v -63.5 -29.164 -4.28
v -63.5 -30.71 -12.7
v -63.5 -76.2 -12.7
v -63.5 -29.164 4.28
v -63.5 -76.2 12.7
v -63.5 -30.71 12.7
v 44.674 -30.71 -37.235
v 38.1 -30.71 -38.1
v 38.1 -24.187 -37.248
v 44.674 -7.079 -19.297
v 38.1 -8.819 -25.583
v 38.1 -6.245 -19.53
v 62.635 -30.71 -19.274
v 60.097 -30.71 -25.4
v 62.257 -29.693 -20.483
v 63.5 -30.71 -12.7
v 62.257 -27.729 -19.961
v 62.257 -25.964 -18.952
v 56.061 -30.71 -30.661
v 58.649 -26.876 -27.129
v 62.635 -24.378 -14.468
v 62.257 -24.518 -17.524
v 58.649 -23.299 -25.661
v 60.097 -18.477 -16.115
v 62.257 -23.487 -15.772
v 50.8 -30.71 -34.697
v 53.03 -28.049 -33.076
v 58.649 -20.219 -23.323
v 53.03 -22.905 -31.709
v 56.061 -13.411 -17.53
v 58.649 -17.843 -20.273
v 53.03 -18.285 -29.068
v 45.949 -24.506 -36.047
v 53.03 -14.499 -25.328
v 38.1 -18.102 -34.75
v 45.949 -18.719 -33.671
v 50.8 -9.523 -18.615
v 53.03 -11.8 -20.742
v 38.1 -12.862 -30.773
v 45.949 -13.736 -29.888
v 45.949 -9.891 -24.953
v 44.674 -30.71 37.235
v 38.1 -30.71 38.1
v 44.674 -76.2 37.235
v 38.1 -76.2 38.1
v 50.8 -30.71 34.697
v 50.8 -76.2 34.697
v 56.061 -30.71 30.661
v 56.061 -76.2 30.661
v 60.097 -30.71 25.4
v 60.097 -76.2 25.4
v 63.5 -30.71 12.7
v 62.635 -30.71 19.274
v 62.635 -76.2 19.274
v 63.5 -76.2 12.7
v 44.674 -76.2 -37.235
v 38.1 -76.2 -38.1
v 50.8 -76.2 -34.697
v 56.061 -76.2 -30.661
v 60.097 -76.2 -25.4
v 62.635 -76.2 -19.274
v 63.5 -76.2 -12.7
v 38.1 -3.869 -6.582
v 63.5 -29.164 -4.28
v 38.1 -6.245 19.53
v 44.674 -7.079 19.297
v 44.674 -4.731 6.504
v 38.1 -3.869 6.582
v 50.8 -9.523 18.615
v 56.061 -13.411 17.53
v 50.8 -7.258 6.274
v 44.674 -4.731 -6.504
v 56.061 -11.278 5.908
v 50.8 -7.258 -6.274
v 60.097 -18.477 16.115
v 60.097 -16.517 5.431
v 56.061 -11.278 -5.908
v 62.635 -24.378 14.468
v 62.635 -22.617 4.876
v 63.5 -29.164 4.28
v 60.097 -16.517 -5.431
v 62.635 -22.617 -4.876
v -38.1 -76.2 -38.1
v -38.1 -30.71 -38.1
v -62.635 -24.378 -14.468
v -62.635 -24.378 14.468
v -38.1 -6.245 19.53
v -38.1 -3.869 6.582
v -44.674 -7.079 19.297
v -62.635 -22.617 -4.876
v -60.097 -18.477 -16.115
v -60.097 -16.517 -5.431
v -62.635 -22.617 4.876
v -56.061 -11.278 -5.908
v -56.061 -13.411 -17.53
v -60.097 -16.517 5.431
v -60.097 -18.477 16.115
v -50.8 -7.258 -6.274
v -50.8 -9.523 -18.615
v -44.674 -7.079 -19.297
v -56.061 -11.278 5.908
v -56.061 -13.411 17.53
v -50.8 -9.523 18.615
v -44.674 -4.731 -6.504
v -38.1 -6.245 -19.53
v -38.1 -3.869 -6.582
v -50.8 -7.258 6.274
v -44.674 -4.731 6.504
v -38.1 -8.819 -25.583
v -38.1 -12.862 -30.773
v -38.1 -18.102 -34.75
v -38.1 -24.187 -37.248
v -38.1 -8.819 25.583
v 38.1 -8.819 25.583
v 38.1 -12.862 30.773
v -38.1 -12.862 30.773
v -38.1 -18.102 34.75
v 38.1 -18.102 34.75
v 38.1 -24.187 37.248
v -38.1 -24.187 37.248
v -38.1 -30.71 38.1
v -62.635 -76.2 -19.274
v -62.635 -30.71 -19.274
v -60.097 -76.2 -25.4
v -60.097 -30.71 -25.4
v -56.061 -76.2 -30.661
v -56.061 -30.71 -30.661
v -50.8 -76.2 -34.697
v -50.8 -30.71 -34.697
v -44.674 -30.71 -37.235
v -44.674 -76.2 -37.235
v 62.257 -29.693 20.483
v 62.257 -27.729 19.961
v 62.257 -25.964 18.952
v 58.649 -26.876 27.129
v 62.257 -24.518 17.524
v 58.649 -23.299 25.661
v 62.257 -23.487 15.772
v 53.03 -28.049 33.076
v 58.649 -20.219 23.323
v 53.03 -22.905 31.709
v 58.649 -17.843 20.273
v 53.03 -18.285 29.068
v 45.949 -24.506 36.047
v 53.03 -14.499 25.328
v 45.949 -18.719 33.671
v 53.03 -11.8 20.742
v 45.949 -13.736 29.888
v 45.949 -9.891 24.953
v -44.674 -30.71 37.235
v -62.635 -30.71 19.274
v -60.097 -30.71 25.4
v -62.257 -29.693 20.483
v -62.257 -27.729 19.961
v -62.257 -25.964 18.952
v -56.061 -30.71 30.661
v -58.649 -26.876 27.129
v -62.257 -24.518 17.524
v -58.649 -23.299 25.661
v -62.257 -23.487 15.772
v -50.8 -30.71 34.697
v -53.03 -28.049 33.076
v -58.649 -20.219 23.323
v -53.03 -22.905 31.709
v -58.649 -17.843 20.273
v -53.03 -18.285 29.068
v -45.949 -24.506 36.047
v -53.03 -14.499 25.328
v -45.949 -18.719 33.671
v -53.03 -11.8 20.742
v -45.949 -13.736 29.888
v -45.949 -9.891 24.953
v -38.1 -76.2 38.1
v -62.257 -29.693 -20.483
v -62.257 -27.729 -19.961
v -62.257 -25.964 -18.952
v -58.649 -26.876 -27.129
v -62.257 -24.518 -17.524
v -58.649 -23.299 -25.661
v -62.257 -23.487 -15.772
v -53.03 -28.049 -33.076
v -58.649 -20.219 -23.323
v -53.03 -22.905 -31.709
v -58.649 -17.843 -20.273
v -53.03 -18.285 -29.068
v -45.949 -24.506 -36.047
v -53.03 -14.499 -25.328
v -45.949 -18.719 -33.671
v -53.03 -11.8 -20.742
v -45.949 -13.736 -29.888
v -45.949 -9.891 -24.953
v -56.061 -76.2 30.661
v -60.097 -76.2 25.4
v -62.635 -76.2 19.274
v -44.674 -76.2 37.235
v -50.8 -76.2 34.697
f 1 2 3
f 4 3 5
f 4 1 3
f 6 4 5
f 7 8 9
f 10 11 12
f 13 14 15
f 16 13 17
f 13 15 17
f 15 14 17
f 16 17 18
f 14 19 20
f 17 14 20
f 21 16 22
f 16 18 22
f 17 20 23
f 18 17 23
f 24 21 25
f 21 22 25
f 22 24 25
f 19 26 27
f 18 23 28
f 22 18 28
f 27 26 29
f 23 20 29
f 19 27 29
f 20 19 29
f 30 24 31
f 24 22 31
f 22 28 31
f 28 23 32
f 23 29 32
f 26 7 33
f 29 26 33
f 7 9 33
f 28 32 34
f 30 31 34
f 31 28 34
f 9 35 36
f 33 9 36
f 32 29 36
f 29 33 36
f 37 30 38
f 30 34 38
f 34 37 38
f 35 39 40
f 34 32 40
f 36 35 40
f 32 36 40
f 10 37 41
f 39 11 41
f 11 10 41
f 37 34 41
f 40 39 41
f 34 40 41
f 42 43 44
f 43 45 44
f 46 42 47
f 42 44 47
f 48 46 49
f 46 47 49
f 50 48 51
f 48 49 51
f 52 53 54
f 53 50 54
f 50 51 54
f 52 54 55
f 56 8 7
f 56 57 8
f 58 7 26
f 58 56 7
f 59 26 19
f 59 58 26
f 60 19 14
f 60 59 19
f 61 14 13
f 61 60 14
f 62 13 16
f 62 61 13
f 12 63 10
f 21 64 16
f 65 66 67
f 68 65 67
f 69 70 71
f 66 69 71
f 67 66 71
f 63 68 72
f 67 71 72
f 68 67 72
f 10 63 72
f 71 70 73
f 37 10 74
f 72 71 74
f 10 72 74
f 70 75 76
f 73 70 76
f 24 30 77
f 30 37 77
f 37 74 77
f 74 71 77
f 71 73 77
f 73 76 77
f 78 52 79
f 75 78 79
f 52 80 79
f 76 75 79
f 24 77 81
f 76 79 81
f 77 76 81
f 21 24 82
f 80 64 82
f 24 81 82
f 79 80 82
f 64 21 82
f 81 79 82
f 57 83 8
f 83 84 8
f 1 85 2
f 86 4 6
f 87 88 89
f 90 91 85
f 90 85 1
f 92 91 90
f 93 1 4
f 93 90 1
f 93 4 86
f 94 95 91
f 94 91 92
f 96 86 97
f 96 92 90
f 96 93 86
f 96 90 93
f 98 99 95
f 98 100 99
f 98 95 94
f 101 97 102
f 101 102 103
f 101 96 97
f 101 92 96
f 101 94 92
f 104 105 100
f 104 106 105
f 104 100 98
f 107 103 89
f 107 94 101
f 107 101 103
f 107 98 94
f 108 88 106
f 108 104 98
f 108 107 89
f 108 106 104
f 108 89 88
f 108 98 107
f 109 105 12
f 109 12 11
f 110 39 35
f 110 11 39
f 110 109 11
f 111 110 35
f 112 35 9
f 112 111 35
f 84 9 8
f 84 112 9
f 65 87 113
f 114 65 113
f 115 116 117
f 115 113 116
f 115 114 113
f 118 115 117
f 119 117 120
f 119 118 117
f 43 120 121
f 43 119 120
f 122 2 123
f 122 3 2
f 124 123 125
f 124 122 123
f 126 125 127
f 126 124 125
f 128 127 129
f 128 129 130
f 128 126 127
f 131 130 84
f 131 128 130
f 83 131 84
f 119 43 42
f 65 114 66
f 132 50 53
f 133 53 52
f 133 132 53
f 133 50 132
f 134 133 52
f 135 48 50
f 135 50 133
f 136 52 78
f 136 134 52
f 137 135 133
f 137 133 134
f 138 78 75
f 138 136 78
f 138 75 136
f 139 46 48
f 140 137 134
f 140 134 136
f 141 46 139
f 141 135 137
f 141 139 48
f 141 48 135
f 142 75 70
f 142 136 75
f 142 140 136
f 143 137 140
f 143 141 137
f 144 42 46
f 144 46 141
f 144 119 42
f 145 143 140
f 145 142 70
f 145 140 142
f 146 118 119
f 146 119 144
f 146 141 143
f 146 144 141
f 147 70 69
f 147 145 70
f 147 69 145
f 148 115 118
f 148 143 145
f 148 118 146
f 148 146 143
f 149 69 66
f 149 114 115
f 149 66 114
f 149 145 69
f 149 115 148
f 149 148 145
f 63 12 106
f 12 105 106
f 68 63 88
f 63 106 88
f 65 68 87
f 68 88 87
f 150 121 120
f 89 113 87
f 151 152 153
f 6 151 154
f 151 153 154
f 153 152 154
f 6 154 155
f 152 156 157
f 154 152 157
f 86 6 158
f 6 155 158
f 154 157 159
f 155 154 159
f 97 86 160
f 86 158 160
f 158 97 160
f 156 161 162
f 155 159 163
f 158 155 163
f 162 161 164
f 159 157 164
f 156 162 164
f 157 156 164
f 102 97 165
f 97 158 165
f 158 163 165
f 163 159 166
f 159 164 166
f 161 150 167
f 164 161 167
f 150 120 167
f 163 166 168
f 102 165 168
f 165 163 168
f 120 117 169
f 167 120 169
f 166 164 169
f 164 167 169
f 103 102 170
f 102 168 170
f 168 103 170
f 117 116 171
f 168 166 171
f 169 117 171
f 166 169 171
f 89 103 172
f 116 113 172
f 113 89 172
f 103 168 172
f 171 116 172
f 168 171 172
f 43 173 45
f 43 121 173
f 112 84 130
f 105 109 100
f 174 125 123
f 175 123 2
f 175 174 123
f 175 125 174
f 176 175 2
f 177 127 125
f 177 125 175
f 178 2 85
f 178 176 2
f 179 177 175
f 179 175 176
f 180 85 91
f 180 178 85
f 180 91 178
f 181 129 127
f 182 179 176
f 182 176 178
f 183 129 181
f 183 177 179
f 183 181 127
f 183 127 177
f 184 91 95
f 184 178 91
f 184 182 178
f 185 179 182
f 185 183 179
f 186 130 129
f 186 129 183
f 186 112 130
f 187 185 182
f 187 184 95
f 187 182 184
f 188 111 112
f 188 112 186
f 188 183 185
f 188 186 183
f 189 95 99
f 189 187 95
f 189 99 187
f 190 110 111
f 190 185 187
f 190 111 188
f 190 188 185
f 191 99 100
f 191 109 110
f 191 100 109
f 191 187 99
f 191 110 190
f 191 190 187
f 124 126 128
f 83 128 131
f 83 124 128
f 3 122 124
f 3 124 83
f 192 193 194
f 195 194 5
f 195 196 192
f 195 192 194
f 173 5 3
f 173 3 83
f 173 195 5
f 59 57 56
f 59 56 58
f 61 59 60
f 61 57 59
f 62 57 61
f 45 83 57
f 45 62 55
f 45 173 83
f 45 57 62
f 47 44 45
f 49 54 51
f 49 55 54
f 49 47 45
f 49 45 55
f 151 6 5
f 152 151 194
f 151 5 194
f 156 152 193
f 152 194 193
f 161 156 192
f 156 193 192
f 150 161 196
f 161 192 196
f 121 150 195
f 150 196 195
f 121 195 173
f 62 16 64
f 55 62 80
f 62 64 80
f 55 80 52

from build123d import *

# Parameters (mm, degrees)
F0_W     = 127
F0_H     = 76.2
F1_DEPTH = 76.2
F3_DEPTH = 127.001
F4_R     = 25.4


with BuildPart() as f1:
    # F0 (on Front) → F1 (new body)
    with BuildSketch(Plane.XZ):
        Rectangle(F0_W, F0_H)
    extrude(amount=F1_DEPTH)

    # F2 (on face) → F3 (cut, through all)
    with BuildSketch(Plane(origin=(-63.5, 0, 0), x_dir=(0, -1, 0), z_dir=(-1, 0, 0))):
        with BuildLine():
            ThreePointArc((14.3655382942, 38.1), (37.6635127669, 61.5633803993), (68.9486063382, 72.2670598849))
            Line((68.9486063382, 72.2670598849), (-52.0951251411, 60.1213361119))
            Line((-52.0951251411, 60.1213361119), (-33.0926589668, -48.5322624445))
            Line((-33.0926589668, -48.5322624445), (48.5539544729, -67.162540312))
            ThreePointArc((48.5539544729, -67.162540312), (29.1590805148, -55.3377136177), (14.3655382942, -38.1))
            Line((14.3655382942, -38.1), (0, -38.1))
            Line((0, -38.1), (0, 38.1))
            Line((0, 38.1), (14.3655382942, 38.1))
        make_face()
        with BuildLine():
            ThreePointArc((14.3655382942, -38.1), (3.5700429957, 0), (14.3655382942, 38.1))
            Line((14.3655382942, 38.1), (0, 38.1))
            Line((0, 38.1), (0, -38.1))
            Line((0, -38.1), (14.3655382942, -38.1))
        make_face()
    extrude(amount=-F3_DEPTH, mode=Mode.SUBTRACT)

    # F4
    f4_edges = [f1.edges().sort_by_distance(p)[0] for p in [
        (-63.5, -45.282769, 38.1),
        (63.5, -45.282769, 38.1),
        (-63.5, -45.282769, -38.1),
        (63.5, -45.282769, -38.1),
        (63.5, -3.570043, 0),
        (-63.5, -3.570043, 0),
        (0, -14.365538, -38.1),
        (0, -14.365538, 38.1),
    ]]
    fillet(f4_edges, radius=F4_R)


solid = f1.part
